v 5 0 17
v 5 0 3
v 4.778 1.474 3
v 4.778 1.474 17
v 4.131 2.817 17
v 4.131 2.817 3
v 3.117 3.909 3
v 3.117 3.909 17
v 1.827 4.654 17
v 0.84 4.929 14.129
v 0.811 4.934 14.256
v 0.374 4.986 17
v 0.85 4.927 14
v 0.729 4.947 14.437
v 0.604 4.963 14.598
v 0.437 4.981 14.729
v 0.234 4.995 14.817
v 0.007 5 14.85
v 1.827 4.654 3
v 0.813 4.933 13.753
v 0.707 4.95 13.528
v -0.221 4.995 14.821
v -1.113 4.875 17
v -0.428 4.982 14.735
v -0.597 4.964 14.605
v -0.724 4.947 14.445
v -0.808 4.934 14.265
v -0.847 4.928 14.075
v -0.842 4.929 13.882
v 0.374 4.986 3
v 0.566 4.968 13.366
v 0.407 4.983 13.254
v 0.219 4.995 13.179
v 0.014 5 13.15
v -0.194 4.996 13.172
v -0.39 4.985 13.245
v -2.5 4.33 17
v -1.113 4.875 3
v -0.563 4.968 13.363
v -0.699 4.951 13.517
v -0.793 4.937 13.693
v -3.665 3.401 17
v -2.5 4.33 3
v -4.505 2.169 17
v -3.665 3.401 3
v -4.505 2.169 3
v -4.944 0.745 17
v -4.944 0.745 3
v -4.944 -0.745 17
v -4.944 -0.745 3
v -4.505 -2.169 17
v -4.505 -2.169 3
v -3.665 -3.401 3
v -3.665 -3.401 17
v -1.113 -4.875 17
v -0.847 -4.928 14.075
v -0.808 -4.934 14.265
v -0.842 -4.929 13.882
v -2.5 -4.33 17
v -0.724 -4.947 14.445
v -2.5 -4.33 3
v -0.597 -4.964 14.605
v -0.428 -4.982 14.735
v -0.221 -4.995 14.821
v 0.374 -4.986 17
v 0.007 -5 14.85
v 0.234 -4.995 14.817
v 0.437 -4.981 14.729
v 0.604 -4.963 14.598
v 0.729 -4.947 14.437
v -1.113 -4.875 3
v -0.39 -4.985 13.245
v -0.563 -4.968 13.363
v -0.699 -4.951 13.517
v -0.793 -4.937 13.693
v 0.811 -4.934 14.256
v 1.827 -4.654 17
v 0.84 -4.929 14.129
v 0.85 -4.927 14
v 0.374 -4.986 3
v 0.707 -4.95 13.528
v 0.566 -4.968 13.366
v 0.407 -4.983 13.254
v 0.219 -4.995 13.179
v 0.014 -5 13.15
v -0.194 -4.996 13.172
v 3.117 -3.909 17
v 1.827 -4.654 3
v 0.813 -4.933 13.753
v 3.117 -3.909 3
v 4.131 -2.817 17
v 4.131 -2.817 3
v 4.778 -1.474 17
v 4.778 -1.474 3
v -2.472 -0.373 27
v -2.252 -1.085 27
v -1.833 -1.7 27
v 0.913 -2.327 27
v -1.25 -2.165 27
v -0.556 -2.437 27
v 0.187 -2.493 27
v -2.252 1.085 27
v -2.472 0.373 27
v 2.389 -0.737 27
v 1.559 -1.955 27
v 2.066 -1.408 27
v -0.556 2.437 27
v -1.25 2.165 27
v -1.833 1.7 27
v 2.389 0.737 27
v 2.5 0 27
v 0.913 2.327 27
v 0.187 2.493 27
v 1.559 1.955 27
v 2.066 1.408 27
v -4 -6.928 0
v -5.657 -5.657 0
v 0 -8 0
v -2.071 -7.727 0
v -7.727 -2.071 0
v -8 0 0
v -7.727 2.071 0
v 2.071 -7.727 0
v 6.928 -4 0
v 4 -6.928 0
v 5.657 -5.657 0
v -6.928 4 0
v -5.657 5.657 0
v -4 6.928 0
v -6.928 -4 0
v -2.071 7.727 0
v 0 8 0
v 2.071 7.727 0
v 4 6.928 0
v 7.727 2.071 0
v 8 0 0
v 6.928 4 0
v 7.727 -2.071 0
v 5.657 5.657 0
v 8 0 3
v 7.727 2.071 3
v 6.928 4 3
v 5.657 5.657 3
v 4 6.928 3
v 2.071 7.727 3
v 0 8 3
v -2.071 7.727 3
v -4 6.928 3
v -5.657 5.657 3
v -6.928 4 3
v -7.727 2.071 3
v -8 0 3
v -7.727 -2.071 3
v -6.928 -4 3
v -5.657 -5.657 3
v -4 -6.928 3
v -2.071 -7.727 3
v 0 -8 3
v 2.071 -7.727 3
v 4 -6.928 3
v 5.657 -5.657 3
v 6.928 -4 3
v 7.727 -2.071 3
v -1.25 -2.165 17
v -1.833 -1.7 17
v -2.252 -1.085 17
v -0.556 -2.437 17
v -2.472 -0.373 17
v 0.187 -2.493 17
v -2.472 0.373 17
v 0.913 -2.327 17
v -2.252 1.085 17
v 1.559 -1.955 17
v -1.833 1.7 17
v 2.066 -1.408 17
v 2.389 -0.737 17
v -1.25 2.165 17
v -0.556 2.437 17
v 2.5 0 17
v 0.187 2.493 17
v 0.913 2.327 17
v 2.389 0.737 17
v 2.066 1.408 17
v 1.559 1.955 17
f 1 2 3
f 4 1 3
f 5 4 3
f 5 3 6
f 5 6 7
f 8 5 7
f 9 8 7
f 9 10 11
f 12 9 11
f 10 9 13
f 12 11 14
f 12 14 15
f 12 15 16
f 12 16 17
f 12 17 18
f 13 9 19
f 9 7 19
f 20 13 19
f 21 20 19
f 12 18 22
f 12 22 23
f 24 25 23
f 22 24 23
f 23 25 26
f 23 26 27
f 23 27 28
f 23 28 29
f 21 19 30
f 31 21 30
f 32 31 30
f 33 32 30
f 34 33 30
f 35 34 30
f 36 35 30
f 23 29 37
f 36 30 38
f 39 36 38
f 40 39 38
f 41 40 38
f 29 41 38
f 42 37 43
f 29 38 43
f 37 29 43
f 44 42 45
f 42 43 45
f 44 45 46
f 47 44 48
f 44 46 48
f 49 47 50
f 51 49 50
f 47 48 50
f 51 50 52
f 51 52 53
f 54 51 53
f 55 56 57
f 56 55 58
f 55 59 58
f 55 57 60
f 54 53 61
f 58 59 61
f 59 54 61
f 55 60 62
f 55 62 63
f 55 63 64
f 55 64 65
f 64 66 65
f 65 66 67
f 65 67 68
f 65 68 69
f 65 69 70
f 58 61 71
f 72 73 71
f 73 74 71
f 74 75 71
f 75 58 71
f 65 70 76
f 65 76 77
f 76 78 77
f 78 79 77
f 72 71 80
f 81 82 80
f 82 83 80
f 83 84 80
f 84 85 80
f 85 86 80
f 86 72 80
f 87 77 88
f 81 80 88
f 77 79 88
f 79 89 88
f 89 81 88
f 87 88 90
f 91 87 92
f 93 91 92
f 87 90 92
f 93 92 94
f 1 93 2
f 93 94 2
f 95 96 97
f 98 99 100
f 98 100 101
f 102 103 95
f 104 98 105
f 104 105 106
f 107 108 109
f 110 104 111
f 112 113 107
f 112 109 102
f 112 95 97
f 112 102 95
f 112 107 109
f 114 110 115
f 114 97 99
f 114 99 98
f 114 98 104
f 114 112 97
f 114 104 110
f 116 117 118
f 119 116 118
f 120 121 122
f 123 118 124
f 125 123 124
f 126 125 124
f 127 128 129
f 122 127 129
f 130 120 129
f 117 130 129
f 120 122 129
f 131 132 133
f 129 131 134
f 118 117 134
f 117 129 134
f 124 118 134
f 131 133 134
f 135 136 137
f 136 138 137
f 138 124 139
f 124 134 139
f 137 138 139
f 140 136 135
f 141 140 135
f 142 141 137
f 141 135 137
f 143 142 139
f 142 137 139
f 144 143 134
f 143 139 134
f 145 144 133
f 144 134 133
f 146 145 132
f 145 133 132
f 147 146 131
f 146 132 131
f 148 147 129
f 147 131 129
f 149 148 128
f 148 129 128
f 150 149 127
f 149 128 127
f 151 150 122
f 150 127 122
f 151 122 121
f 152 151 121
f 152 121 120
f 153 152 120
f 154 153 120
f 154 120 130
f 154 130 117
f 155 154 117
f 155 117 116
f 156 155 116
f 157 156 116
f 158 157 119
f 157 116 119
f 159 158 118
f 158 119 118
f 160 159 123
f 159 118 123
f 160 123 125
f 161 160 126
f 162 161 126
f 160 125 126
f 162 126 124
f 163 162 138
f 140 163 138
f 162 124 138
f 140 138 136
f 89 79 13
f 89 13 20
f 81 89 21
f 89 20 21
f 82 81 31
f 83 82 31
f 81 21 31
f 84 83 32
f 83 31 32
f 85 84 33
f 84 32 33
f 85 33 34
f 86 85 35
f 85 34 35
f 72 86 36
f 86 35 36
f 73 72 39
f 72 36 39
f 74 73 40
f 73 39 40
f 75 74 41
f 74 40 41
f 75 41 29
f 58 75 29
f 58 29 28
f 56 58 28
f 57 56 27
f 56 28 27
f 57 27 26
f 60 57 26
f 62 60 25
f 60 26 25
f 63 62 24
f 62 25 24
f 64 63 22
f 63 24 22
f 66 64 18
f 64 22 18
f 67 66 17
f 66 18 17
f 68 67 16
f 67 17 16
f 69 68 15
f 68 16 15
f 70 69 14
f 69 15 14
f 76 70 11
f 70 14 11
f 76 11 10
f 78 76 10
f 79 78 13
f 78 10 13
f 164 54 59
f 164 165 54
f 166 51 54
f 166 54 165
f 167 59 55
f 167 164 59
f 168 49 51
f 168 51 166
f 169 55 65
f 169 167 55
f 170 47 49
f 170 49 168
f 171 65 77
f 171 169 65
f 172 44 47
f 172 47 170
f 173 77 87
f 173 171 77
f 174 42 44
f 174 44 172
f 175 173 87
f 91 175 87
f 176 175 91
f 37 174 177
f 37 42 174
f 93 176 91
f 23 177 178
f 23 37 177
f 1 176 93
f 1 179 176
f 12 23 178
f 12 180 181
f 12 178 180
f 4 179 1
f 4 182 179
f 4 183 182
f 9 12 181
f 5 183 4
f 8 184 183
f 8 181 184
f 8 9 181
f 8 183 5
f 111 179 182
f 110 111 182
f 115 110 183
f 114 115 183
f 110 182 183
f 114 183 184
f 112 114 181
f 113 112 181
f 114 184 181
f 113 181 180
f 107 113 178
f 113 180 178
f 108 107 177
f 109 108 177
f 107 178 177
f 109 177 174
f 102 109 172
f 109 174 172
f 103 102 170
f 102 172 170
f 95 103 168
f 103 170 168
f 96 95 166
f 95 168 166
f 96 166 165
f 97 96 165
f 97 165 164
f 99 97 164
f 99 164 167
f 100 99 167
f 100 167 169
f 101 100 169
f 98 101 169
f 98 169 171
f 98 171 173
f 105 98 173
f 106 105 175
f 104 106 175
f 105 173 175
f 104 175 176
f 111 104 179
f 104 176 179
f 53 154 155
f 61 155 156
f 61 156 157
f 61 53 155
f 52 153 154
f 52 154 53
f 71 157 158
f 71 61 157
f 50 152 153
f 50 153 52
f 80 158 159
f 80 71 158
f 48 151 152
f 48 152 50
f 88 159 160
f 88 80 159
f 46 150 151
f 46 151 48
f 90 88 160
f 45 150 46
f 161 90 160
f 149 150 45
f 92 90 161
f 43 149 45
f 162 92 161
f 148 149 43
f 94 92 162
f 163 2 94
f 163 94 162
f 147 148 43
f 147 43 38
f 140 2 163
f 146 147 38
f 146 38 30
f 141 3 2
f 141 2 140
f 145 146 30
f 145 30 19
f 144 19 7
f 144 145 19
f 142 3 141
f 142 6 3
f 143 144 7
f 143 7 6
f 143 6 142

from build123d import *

# Parameters (mm, degrees)
SKETCH1_R           = 8
BOSS_EXTRUDE1_DEPTH = 3
SKETCH2_R           = 5
BOSS_EXTRUDE2_DEPTH = 14
SKETCH3_R           = 2.5
BOSS_EXTRUDE3_DEPTH = 10
SKETCH4_R           = 0.85
CUT_EXTRUDE1_DEPTH  = 7.5


with BuildPart() as part:
    # Sketch1 → Boss-Extrude1 (new body)
    with BuildSketch(Plane.XY):
        Circle(SKETCH1_R)
    extrude(amount=BOSS_EXTRUDE1_DEPTH)

    # Sketch2 → Boss-Extrude2 (add)
    with BuildSketch(Plane.XY.offset(3)):
        Circle(SKETCH2_R)
    extrude(amount=BOSS_EXTRUDE2_DEPTH)

    # Sketch3 → Boss-Extrude3 (add)
    with BuildSketch(Plane.XY.offset(17)):
        Circle(SKETCH3_R)
    extrude(amount=BOSS_EXTRUDE3_DEPTH)

    # Sketch4 → Cut-Extrude1 (cut, symmetric)
    with BuildSketch(Plane(origin=(0, 0, 0), x_dir=(1, 0, 0), z_dir=(0, 1, 0))):
        with Locations((0, -14)):
            Circle(SKETCH4_R)
    extrude(amount=CUT_EXTRUDE1_DEPTH, both=True, mode=Mode.SUBTRACT)


solid = part.part
